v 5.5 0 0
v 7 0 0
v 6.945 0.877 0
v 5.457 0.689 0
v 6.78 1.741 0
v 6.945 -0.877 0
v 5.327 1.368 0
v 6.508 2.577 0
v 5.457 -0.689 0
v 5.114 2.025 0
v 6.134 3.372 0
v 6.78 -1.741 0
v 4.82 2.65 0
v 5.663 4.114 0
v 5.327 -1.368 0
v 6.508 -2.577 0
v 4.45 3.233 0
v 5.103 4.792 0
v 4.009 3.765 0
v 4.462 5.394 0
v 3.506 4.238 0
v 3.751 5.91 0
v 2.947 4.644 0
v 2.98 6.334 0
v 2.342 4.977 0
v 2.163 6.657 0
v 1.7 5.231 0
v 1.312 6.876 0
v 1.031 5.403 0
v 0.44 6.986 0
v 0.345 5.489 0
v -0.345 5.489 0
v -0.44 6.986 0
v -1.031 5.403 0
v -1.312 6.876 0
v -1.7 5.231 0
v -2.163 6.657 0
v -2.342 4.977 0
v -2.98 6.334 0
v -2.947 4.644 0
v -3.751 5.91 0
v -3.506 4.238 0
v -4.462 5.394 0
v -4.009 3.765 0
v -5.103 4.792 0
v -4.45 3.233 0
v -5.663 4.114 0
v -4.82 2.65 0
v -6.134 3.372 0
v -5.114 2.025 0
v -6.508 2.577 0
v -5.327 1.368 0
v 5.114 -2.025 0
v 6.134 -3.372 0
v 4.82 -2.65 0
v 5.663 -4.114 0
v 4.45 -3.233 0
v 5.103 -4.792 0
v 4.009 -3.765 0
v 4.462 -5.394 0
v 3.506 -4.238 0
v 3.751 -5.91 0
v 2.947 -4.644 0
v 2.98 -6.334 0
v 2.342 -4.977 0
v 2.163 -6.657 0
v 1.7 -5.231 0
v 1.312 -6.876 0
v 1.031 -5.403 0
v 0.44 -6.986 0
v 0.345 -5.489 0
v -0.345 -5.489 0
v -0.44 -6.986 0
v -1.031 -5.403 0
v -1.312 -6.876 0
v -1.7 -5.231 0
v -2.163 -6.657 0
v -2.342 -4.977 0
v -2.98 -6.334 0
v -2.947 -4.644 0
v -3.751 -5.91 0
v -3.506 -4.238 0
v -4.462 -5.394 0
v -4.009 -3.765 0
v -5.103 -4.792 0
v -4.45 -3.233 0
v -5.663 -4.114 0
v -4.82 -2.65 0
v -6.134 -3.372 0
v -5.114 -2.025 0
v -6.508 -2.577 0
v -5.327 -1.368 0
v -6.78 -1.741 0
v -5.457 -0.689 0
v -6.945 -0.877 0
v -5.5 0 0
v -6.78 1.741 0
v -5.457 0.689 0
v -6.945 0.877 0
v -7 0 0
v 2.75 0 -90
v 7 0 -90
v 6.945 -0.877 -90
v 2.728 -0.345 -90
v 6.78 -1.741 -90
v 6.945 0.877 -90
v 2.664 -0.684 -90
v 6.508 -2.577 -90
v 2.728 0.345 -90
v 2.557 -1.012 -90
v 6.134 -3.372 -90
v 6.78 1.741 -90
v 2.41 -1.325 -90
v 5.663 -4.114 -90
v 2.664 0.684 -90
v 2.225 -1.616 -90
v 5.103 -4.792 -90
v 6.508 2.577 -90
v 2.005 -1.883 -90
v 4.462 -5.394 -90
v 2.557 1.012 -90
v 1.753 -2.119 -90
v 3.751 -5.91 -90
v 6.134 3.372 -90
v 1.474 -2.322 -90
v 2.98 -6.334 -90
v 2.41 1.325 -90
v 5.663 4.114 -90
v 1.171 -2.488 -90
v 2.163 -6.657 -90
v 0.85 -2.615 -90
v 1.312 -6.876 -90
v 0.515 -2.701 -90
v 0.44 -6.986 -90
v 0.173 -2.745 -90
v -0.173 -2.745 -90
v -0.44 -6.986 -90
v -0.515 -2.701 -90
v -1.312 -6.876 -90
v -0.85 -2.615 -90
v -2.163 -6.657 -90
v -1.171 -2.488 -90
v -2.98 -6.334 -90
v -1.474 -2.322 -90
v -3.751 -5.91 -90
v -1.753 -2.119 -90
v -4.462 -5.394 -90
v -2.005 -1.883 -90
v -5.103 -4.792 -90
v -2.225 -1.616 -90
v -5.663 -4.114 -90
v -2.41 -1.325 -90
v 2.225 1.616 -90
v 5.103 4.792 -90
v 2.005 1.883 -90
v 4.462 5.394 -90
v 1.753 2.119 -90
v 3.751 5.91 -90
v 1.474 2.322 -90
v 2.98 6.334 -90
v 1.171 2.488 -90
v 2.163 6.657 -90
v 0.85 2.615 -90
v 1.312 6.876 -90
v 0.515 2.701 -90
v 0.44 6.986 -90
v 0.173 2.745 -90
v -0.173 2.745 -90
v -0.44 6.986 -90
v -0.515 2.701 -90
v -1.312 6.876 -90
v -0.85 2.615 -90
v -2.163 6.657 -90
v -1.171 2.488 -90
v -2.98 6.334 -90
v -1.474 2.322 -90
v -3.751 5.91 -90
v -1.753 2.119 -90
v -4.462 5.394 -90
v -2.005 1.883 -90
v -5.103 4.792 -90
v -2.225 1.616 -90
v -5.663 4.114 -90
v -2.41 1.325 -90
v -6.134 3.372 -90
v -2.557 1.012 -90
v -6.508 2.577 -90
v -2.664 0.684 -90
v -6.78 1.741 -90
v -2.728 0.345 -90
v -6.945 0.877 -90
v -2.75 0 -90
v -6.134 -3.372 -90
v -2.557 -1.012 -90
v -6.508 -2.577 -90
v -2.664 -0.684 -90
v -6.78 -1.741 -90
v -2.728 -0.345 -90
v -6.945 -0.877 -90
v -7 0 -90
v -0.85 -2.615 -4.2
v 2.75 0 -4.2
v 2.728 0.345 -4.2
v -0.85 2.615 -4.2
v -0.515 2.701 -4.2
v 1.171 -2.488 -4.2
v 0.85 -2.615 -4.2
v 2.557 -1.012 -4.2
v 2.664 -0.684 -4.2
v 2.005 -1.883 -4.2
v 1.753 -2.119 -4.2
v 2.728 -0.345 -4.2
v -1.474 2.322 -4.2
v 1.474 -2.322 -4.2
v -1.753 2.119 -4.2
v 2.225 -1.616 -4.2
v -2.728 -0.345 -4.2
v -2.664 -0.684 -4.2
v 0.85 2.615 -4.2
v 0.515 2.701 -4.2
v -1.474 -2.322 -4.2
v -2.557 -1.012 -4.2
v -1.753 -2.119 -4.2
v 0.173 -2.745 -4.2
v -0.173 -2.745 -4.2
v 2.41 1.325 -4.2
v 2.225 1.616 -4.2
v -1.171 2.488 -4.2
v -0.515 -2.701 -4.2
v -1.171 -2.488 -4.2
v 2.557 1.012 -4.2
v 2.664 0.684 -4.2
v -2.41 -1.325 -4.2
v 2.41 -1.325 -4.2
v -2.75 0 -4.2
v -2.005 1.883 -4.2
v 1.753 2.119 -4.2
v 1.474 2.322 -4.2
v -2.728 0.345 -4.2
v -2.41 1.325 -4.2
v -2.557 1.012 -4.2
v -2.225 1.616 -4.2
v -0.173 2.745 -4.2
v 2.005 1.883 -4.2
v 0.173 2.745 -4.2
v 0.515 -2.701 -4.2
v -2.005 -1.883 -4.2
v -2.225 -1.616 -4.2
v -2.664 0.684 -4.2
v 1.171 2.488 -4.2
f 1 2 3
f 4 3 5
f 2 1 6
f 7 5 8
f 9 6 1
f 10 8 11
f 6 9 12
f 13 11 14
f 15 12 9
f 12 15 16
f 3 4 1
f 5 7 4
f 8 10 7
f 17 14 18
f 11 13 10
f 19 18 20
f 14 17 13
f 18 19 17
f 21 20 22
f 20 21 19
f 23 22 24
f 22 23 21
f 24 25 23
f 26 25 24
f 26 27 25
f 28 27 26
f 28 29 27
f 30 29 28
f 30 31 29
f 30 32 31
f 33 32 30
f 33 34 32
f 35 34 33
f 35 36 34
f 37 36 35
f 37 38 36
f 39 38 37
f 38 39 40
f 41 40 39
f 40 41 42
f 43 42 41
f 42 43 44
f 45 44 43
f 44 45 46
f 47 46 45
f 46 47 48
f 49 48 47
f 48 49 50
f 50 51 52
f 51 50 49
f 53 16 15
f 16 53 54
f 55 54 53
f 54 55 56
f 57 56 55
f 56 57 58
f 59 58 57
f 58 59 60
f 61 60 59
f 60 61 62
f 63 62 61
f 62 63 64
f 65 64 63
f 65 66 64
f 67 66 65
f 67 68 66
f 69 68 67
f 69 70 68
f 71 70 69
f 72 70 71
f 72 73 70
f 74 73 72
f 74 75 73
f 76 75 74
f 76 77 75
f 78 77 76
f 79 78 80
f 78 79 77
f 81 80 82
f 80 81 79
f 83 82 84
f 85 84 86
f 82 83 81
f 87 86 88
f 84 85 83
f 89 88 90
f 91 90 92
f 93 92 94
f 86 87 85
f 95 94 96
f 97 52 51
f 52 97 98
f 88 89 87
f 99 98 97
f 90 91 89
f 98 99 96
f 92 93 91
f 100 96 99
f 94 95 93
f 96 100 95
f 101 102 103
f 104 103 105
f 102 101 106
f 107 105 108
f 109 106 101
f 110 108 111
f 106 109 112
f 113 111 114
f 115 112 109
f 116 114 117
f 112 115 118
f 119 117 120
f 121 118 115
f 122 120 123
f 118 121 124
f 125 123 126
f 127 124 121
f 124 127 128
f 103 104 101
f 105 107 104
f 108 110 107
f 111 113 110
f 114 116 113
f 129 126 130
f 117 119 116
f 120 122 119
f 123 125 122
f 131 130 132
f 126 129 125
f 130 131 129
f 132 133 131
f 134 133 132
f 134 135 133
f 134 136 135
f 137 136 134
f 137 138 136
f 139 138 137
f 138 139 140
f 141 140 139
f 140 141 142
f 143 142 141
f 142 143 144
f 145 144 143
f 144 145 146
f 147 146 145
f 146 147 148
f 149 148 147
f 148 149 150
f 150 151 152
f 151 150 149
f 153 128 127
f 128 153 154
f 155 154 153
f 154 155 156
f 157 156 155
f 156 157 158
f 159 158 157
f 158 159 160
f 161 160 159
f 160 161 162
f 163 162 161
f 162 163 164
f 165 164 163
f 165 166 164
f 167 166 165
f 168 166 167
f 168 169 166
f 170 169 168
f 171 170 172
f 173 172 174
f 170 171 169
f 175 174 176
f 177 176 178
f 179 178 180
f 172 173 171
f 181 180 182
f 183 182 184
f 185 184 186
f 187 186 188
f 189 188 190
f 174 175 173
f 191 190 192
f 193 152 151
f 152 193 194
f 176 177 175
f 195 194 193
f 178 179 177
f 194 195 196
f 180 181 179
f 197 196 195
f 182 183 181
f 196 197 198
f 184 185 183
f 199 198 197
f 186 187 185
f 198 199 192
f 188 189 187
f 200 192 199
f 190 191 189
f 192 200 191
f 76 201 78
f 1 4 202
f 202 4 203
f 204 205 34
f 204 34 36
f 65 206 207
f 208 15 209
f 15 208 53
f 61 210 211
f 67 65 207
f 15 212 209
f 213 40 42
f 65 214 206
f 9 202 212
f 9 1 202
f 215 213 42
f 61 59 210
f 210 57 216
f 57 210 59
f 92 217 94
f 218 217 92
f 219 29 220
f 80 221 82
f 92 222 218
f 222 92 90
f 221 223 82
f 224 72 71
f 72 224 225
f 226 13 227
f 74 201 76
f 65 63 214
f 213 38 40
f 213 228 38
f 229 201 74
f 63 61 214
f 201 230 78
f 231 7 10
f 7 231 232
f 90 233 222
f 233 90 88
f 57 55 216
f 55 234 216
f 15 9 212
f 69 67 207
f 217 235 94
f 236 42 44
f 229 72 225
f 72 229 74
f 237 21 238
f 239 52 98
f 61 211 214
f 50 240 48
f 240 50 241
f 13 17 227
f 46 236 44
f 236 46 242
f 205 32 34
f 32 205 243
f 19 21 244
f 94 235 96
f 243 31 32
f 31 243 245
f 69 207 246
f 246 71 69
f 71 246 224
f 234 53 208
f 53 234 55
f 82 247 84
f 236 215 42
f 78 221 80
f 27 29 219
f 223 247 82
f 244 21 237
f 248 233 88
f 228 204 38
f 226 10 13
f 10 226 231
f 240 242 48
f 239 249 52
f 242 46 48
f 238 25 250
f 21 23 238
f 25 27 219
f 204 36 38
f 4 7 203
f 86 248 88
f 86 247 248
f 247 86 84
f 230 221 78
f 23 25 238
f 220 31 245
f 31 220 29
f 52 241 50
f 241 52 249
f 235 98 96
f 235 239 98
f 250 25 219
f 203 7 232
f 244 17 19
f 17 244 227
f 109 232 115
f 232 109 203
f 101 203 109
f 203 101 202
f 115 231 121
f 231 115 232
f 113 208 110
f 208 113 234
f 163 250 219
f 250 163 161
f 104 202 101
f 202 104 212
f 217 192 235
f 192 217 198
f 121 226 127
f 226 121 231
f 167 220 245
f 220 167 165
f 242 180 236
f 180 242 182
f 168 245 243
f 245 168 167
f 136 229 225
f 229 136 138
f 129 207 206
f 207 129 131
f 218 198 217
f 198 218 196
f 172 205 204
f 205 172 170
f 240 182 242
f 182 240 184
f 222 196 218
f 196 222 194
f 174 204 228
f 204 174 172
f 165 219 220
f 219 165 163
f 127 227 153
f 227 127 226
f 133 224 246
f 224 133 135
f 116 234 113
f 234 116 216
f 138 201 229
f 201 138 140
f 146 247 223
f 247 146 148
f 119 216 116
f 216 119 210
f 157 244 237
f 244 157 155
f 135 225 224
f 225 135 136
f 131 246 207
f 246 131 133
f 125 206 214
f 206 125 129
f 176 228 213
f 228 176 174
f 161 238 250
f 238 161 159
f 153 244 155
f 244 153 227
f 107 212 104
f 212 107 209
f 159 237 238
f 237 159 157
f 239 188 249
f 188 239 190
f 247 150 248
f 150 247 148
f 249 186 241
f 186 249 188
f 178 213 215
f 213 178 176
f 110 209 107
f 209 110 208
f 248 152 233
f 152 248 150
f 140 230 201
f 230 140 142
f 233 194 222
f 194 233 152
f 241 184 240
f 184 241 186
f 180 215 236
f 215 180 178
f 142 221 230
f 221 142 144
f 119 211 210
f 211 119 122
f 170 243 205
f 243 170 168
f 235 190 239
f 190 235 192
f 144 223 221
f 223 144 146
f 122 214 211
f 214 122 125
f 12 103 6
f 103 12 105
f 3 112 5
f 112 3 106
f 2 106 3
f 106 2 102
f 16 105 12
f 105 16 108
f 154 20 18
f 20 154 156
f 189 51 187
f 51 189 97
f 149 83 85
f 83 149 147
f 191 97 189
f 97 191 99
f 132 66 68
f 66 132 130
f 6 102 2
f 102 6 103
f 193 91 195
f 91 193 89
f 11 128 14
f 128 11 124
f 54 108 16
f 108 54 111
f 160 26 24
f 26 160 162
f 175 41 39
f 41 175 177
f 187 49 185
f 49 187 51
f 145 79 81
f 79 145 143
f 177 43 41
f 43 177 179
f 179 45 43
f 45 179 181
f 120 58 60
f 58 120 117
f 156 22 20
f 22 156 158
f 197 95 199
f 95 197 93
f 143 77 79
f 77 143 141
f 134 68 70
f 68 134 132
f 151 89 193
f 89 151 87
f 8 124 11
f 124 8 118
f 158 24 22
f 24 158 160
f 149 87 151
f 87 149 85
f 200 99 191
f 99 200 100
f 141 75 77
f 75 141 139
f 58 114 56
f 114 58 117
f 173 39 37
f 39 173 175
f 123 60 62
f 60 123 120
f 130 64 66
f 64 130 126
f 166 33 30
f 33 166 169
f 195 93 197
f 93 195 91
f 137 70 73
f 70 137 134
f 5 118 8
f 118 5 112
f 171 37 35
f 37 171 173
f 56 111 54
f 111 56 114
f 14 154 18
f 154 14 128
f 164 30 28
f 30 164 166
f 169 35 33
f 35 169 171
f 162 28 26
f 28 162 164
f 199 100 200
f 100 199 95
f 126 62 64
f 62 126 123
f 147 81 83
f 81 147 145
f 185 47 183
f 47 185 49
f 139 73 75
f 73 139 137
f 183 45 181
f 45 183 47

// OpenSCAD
$fn = 50;


difference() {
	union() {
		translate(v = [0, 0, -90.0000000000]) {
			cylinder(h = 90, r = 7.0000000000);
		}
		cylinder(h = 0, r = 10.0000000000);
	}
	union() {
		translate(v = [0, 0, 0]) {
			rotate(a = [0, 0, 0]) {
				difference() {
					union() {
						#translate(v = [0, 0, -90.0000000000]) {
							cylinder(h = 90, r = 2.2500000000);
						}
						#translate(v = [0, 0, -4.2000000000]) {
							cylinder(h = 4.2000000000, r = 7.0000000000, r1 = 2.7500000000, r2 = 5.5000000000);
						}
						#translate(v = [0, 0, -90.0000000000]) {
							cylinder(h = 90, r = 2.7500000000);
						}
						#translate(v = [0, 0, -90.0000000000]) {
							cylinder(h = 90, r = 2.2500000000);
						}
					}
					union();
				}
			}
		}
	}
}
